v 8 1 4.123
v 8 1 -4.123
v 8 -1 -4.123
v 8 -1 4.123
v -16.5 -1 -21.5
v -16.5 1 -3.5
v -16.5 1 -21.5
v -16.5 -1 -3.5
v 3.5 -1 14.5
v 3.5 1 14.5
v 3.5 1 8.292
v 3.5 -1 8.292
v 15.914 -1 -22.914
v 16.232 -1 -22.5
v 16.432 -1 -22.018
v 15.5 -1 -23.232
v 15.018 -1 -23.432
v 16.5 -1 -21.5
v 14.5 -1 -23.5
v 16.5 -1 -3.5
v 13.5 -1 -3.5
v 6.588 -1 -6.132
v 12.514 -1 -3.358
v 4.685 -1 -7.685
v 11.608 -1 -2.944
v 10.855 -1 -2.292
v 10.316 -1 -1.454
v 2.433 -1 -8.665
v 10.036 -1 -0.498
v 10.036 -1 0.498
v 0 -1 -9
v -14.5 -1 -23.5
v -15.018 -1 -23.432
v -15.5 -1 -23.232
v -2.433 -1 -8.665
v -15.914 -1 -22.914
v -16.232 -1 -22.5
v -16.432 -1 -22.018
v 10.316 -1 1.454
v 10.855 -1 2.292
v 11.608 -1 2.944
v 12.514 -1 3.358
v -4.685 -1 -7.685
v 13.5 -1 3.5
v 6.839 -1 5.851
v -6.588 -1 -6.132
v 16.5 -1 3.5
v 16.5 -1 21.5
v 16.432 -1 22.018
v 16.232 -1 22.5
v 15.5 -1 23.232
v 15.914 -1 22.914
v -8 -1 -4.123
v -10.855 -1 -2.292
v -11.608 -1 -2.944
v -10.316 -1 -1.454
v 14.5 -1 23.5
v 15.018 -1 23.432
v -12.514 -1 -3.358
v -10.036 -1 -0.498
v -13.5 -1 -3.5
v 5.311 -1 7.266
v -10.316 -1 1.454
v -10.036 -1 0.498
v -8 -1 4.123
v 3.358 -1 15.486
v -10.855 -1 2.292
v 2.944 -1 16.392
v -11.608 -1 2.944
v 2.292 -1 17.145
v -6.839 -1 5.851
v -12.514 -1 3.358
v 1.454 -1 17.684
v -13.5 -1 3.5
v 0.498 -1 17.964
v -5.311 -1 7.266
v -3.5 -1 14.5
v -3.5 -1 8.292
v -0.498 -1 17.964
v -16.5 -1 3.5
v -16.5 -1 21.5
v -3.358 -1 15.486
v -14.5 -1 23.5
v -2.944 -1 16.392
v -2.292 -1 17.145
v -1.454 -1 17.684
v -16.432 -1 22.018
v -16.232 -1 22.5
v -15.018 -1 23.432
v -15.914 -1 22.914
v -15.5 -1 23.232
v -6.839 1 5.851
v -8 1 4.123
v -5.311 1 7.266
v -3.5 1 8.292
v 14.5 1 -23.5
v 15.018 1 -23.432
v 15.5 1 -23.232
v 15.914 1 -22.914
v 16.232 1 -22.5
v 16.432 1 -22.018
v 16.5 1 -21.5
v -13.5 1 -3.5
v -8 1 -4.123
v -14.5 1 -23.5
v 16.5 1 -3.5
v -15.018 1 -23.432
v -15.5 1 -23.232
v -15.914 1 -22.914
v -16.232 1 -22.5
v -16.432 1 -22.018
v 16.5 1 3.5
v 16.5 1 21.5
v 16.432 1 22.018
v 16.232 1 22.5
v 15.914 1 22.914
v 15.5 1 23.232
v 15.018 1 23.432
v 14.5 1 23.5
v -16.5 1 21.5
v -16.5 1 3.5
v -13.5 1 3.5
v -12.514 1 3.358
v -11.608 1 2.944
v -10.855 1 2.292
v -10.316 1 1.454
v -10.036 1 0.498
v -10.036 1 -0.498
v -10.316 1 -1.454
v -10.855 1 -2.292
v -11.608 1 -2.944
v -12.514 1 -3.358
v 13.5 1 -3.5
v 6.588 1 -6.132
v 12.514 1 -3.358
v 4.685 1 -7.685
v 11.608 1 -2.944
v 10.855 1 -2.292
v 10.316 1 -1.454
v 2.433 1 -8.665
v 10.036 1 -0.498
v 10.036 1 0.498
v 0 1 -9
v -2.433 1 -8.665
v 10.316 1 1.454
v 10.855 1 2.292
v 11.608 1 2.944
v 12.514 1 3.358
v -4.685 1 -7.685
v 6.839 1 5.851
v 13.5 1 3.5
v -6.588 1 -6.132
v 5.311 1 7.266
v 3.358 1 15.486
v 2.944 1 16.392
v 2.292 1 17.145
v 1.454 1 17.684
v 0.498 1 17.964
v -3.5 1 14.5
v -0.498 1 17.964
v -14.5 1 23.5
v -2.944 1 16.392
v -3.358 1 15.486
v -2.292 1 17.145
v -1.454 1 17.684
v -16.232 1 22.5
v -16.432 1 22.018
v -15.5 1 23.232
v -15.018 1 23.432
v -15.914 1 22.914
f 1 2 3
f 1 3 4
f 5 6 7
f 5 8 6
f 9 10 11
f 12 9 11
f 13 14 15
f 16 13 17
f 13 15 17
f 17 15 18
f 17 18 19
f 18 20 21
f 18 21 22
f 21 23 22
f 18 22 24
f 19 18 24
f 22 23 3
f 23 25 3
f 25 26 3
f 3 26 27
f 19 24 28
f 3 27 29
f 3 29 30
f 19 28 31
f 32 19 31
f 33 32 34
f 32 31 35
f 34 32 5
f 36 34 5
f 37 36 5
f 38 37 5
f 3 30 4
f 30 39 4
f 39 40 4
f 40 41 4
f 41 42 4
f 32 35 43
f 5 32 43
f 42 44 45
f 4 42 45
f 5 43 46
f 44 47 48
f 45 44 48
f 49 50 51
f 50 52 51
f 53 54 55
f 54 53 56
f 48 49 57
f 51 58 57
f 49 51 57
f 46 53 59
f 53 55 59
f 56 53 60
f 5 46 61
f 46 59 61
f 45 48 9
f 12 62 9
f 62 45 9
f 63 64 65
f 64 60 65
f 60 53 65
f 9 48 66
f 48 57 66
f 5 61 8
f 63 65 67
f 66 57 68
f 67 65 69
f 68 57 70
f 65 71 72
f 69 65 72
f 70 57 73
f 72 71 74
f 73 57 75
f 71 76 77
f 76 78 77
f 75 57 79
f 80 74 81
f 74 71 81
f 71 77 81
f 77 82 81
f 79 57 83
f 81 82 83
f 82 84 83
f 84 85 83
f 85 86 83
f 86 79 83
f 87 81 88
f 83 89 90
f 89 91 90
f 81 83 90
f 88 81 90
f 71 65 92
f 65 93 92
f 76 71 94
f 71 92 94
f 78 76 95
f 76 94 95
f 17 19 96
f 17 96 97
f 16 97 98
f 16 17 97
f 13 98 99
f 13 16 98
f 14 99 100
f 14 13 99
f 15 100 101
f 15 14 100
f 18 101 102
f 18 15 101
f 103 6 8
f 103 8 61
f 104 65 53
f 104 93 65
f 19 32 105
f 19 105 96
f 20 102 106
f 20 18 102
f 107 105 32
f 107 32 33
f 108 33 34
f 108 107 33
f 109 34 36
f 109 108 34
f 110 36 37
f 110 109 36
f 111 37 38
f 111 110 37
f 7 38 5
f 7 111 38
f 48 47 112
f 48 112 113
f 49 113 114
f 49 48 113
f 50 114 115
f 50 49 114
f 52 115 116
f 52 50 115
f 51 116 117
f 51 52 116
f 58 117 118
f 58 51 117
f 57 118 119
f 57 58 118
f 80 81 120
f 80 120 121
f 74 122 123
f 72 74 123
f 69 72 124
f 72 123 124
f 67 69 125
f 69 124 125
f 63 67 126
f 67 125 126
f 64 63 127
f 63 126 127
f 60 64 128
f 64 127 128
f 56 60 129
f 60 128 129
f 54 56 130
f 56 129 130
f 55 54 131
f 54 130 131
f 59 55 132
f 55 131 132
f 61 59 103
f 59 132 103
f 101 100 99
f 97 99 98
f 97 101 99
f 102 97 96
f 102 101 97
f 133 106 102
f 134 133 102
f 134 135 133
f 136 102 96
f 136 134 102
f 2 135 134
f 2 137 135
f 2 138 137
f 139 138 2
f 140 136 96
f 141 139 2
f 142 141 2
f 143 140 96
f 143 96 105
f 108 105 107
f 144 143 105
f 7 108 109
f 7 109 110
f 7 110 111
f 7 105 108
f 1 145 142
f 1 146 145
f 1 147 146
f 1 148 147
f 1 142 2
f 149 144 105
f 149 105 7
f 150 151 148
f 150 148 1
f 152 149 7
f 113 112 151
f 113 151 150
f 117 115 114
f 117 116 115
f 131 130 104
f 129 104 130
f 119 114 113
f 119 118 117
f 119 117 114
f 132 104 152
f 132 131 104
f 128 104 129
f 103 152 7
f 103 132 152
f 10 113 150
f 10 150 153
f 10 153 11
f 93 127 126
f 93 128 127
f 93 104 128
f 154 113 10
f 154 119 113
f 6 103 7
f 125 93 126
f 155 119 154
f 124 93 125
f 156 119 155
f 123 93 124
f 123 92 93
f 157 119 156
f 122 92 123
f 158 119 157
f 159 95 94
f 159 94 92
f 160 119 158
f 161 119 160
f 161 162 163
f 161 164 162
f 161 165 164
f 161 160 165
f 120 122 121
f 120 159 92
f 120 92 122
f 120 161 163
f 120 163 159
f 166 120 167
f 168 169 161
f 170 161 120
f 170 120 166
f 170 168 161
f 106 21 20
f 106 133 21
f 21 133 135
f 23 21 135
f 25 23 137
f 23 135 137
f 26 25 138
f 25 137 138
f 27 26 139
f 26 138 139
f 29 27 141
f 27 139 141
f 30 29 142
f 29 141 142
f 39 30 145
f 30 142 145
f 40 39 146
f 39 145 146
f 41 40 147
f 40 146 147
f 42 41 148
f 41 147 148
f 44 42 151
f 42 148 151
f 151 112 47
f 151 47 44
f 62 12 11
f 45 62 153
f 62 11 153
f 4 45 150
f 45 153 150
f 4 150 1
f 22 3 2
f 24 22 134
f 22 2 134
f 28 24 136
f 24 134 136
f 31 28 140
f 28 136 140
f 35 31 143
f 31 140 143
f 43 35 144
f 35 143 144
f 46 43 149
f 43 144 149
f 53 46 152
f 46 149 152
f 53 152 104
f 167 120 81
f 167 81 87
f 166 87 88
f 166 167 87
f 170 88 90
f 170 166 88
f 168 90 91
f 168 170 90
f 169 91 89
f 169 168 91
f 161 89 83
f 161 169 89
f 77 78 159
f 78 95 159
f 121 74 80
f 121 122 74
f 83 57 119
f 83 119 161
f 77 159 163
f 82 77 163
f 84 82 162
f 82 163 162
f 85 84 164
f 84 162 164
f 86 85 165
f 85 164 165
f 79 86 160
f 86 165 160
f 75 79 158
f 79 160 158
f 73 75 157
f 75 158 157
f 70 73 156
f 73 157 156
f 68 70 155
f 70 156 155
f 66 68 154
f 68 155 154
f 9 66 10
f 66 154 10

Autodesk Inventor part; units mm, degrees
ref_plane "YZ Plane" through (0, 0, 0) normal (1, 0, 0) x (0, 1, 0)
ref_plane "XZ Plane" through (0, 0, 0) normal (0, 1, 0) x (-1, 0, 0)
ref_plane "XY Plane" through (0, 0, 0) normal (0, 0, 1) x (1, 0, 0)
sketch "Sketch1" plane through (0, 0, 0) normal (0, 1, 0) x (-1, 0, 0)
  line L0 (16.5, -23.5) -> (-16.5, -23.5)
  line L1 (-16.5, -23.5) -> (-16.5, 23.5)
  line L2 (-16.5, 23.5) -> (16.5, 23.5)
  line L3 (16.5, 23.5) -> (16.5, -23.5)
  point P0 (0, 0)
  point P1 (16.5, 0)
  point P2 (0, -23.5)
  dimension "d0" = 33
  dimension "d1" = 47
extrude "Extrusion1" add sketch "Sketch1" along normal mid plane 2
sketch "Sketch2" plane through (0, 1, 0) normal (0, 1, 0) x (1, 0, 0)
  circle A0 centre (0, 0) radius 9
  line L0 (-8, -4.1231) -> (-8, 4.1231)
  line L1 (8, 4.1231) -> (8, -4.1231)
  line L2 (0, 32.9) -> (0, -32.9) projected
  dimension "d4" = 18
  dimension "d5" = 16
extrude "Extrusion2" cut sketch "Sketch2" against normal through all contours L1 A0 L2 | L2 A0 L0
sketch "Sketch3" plane through (0, 1, 0) normal (0, 1, 0) x (1, 0, 0)
  line L0 (-3.5, -8.2916) -> (-3.5, -14.5)
  arc A0 (-3.5, -14.5) -> (3.5, -14.5) centre (0, -14.5) ccw
  line L1 (3.5, -14.5) -> (3.5, -8.2916)
  line L2 (16.5, -3.5) -> (13.5, -3.5)
  arc A1 (13.5, 3.5) -> (13.5, -3.5) centre (13.5, 0) ccw
  line L3 (13.5, 3.5) -> (16.5, 3.5)
  line L4 (-16.5, 3.5) -> (-13.5, 3.5)
  arc A2 (-13.5, -3.5) -> (-13.5, 3.5) centre (-13.5, 0) ccw
  line L5 (-13.5, -3.5) -> (-16.5, -3.5)
  line L6 (8, 4.1231) -> (8, -4.1231) projected
  arc A3 (-8, -4.1231) -> (8, -4.1231) centre (0, 0) ccw projected
  line L7 (-8, -4.1231) -> (-8, 4.1231) projected
  arc A4 (8, 4.1231) -> (-8, 4.1231) centre (0, 0) ccw projected
  line L8 (16.5, 23.5) -> (16.5, -23.5) projected
  line L9 (-16.5, 23.5) -> (16.5, 23.5) projected
  line L10 (-16.5, -23.5) -> (-16.5, 23.5) projected
  line L11 (16.5, -23.5) -> (-16.5, -23.5) projected
  line L12 (-23.1, 0) -> (23.1, 0) projected
  line L13 (0, 32.9) -> (0, -32.9) projected
  dimension "d8" = 20
  dimension "d9" = 7
  dimension "d10" = 7
  dimension "d11" = 27
extrude "Extrusion3" cut sketch "Sketch3" against normal through all contours A3 L13 A0 L0 | A3 L1 A0 L13 | L12 L10 L4 A2 | A2 L5 L10 L12 | L12 L8 L2 A1 | A1 L3 L8 L12
fillet "Fillet1" radius 2 4 edges at (-16.5, 0, 23.5) (16.5, 0, 23.5) (16.5, 0, -23.5) (-16.5, 0, -23.5)
properties part number "Quick Release Rubber Pad" material "Rubber"
